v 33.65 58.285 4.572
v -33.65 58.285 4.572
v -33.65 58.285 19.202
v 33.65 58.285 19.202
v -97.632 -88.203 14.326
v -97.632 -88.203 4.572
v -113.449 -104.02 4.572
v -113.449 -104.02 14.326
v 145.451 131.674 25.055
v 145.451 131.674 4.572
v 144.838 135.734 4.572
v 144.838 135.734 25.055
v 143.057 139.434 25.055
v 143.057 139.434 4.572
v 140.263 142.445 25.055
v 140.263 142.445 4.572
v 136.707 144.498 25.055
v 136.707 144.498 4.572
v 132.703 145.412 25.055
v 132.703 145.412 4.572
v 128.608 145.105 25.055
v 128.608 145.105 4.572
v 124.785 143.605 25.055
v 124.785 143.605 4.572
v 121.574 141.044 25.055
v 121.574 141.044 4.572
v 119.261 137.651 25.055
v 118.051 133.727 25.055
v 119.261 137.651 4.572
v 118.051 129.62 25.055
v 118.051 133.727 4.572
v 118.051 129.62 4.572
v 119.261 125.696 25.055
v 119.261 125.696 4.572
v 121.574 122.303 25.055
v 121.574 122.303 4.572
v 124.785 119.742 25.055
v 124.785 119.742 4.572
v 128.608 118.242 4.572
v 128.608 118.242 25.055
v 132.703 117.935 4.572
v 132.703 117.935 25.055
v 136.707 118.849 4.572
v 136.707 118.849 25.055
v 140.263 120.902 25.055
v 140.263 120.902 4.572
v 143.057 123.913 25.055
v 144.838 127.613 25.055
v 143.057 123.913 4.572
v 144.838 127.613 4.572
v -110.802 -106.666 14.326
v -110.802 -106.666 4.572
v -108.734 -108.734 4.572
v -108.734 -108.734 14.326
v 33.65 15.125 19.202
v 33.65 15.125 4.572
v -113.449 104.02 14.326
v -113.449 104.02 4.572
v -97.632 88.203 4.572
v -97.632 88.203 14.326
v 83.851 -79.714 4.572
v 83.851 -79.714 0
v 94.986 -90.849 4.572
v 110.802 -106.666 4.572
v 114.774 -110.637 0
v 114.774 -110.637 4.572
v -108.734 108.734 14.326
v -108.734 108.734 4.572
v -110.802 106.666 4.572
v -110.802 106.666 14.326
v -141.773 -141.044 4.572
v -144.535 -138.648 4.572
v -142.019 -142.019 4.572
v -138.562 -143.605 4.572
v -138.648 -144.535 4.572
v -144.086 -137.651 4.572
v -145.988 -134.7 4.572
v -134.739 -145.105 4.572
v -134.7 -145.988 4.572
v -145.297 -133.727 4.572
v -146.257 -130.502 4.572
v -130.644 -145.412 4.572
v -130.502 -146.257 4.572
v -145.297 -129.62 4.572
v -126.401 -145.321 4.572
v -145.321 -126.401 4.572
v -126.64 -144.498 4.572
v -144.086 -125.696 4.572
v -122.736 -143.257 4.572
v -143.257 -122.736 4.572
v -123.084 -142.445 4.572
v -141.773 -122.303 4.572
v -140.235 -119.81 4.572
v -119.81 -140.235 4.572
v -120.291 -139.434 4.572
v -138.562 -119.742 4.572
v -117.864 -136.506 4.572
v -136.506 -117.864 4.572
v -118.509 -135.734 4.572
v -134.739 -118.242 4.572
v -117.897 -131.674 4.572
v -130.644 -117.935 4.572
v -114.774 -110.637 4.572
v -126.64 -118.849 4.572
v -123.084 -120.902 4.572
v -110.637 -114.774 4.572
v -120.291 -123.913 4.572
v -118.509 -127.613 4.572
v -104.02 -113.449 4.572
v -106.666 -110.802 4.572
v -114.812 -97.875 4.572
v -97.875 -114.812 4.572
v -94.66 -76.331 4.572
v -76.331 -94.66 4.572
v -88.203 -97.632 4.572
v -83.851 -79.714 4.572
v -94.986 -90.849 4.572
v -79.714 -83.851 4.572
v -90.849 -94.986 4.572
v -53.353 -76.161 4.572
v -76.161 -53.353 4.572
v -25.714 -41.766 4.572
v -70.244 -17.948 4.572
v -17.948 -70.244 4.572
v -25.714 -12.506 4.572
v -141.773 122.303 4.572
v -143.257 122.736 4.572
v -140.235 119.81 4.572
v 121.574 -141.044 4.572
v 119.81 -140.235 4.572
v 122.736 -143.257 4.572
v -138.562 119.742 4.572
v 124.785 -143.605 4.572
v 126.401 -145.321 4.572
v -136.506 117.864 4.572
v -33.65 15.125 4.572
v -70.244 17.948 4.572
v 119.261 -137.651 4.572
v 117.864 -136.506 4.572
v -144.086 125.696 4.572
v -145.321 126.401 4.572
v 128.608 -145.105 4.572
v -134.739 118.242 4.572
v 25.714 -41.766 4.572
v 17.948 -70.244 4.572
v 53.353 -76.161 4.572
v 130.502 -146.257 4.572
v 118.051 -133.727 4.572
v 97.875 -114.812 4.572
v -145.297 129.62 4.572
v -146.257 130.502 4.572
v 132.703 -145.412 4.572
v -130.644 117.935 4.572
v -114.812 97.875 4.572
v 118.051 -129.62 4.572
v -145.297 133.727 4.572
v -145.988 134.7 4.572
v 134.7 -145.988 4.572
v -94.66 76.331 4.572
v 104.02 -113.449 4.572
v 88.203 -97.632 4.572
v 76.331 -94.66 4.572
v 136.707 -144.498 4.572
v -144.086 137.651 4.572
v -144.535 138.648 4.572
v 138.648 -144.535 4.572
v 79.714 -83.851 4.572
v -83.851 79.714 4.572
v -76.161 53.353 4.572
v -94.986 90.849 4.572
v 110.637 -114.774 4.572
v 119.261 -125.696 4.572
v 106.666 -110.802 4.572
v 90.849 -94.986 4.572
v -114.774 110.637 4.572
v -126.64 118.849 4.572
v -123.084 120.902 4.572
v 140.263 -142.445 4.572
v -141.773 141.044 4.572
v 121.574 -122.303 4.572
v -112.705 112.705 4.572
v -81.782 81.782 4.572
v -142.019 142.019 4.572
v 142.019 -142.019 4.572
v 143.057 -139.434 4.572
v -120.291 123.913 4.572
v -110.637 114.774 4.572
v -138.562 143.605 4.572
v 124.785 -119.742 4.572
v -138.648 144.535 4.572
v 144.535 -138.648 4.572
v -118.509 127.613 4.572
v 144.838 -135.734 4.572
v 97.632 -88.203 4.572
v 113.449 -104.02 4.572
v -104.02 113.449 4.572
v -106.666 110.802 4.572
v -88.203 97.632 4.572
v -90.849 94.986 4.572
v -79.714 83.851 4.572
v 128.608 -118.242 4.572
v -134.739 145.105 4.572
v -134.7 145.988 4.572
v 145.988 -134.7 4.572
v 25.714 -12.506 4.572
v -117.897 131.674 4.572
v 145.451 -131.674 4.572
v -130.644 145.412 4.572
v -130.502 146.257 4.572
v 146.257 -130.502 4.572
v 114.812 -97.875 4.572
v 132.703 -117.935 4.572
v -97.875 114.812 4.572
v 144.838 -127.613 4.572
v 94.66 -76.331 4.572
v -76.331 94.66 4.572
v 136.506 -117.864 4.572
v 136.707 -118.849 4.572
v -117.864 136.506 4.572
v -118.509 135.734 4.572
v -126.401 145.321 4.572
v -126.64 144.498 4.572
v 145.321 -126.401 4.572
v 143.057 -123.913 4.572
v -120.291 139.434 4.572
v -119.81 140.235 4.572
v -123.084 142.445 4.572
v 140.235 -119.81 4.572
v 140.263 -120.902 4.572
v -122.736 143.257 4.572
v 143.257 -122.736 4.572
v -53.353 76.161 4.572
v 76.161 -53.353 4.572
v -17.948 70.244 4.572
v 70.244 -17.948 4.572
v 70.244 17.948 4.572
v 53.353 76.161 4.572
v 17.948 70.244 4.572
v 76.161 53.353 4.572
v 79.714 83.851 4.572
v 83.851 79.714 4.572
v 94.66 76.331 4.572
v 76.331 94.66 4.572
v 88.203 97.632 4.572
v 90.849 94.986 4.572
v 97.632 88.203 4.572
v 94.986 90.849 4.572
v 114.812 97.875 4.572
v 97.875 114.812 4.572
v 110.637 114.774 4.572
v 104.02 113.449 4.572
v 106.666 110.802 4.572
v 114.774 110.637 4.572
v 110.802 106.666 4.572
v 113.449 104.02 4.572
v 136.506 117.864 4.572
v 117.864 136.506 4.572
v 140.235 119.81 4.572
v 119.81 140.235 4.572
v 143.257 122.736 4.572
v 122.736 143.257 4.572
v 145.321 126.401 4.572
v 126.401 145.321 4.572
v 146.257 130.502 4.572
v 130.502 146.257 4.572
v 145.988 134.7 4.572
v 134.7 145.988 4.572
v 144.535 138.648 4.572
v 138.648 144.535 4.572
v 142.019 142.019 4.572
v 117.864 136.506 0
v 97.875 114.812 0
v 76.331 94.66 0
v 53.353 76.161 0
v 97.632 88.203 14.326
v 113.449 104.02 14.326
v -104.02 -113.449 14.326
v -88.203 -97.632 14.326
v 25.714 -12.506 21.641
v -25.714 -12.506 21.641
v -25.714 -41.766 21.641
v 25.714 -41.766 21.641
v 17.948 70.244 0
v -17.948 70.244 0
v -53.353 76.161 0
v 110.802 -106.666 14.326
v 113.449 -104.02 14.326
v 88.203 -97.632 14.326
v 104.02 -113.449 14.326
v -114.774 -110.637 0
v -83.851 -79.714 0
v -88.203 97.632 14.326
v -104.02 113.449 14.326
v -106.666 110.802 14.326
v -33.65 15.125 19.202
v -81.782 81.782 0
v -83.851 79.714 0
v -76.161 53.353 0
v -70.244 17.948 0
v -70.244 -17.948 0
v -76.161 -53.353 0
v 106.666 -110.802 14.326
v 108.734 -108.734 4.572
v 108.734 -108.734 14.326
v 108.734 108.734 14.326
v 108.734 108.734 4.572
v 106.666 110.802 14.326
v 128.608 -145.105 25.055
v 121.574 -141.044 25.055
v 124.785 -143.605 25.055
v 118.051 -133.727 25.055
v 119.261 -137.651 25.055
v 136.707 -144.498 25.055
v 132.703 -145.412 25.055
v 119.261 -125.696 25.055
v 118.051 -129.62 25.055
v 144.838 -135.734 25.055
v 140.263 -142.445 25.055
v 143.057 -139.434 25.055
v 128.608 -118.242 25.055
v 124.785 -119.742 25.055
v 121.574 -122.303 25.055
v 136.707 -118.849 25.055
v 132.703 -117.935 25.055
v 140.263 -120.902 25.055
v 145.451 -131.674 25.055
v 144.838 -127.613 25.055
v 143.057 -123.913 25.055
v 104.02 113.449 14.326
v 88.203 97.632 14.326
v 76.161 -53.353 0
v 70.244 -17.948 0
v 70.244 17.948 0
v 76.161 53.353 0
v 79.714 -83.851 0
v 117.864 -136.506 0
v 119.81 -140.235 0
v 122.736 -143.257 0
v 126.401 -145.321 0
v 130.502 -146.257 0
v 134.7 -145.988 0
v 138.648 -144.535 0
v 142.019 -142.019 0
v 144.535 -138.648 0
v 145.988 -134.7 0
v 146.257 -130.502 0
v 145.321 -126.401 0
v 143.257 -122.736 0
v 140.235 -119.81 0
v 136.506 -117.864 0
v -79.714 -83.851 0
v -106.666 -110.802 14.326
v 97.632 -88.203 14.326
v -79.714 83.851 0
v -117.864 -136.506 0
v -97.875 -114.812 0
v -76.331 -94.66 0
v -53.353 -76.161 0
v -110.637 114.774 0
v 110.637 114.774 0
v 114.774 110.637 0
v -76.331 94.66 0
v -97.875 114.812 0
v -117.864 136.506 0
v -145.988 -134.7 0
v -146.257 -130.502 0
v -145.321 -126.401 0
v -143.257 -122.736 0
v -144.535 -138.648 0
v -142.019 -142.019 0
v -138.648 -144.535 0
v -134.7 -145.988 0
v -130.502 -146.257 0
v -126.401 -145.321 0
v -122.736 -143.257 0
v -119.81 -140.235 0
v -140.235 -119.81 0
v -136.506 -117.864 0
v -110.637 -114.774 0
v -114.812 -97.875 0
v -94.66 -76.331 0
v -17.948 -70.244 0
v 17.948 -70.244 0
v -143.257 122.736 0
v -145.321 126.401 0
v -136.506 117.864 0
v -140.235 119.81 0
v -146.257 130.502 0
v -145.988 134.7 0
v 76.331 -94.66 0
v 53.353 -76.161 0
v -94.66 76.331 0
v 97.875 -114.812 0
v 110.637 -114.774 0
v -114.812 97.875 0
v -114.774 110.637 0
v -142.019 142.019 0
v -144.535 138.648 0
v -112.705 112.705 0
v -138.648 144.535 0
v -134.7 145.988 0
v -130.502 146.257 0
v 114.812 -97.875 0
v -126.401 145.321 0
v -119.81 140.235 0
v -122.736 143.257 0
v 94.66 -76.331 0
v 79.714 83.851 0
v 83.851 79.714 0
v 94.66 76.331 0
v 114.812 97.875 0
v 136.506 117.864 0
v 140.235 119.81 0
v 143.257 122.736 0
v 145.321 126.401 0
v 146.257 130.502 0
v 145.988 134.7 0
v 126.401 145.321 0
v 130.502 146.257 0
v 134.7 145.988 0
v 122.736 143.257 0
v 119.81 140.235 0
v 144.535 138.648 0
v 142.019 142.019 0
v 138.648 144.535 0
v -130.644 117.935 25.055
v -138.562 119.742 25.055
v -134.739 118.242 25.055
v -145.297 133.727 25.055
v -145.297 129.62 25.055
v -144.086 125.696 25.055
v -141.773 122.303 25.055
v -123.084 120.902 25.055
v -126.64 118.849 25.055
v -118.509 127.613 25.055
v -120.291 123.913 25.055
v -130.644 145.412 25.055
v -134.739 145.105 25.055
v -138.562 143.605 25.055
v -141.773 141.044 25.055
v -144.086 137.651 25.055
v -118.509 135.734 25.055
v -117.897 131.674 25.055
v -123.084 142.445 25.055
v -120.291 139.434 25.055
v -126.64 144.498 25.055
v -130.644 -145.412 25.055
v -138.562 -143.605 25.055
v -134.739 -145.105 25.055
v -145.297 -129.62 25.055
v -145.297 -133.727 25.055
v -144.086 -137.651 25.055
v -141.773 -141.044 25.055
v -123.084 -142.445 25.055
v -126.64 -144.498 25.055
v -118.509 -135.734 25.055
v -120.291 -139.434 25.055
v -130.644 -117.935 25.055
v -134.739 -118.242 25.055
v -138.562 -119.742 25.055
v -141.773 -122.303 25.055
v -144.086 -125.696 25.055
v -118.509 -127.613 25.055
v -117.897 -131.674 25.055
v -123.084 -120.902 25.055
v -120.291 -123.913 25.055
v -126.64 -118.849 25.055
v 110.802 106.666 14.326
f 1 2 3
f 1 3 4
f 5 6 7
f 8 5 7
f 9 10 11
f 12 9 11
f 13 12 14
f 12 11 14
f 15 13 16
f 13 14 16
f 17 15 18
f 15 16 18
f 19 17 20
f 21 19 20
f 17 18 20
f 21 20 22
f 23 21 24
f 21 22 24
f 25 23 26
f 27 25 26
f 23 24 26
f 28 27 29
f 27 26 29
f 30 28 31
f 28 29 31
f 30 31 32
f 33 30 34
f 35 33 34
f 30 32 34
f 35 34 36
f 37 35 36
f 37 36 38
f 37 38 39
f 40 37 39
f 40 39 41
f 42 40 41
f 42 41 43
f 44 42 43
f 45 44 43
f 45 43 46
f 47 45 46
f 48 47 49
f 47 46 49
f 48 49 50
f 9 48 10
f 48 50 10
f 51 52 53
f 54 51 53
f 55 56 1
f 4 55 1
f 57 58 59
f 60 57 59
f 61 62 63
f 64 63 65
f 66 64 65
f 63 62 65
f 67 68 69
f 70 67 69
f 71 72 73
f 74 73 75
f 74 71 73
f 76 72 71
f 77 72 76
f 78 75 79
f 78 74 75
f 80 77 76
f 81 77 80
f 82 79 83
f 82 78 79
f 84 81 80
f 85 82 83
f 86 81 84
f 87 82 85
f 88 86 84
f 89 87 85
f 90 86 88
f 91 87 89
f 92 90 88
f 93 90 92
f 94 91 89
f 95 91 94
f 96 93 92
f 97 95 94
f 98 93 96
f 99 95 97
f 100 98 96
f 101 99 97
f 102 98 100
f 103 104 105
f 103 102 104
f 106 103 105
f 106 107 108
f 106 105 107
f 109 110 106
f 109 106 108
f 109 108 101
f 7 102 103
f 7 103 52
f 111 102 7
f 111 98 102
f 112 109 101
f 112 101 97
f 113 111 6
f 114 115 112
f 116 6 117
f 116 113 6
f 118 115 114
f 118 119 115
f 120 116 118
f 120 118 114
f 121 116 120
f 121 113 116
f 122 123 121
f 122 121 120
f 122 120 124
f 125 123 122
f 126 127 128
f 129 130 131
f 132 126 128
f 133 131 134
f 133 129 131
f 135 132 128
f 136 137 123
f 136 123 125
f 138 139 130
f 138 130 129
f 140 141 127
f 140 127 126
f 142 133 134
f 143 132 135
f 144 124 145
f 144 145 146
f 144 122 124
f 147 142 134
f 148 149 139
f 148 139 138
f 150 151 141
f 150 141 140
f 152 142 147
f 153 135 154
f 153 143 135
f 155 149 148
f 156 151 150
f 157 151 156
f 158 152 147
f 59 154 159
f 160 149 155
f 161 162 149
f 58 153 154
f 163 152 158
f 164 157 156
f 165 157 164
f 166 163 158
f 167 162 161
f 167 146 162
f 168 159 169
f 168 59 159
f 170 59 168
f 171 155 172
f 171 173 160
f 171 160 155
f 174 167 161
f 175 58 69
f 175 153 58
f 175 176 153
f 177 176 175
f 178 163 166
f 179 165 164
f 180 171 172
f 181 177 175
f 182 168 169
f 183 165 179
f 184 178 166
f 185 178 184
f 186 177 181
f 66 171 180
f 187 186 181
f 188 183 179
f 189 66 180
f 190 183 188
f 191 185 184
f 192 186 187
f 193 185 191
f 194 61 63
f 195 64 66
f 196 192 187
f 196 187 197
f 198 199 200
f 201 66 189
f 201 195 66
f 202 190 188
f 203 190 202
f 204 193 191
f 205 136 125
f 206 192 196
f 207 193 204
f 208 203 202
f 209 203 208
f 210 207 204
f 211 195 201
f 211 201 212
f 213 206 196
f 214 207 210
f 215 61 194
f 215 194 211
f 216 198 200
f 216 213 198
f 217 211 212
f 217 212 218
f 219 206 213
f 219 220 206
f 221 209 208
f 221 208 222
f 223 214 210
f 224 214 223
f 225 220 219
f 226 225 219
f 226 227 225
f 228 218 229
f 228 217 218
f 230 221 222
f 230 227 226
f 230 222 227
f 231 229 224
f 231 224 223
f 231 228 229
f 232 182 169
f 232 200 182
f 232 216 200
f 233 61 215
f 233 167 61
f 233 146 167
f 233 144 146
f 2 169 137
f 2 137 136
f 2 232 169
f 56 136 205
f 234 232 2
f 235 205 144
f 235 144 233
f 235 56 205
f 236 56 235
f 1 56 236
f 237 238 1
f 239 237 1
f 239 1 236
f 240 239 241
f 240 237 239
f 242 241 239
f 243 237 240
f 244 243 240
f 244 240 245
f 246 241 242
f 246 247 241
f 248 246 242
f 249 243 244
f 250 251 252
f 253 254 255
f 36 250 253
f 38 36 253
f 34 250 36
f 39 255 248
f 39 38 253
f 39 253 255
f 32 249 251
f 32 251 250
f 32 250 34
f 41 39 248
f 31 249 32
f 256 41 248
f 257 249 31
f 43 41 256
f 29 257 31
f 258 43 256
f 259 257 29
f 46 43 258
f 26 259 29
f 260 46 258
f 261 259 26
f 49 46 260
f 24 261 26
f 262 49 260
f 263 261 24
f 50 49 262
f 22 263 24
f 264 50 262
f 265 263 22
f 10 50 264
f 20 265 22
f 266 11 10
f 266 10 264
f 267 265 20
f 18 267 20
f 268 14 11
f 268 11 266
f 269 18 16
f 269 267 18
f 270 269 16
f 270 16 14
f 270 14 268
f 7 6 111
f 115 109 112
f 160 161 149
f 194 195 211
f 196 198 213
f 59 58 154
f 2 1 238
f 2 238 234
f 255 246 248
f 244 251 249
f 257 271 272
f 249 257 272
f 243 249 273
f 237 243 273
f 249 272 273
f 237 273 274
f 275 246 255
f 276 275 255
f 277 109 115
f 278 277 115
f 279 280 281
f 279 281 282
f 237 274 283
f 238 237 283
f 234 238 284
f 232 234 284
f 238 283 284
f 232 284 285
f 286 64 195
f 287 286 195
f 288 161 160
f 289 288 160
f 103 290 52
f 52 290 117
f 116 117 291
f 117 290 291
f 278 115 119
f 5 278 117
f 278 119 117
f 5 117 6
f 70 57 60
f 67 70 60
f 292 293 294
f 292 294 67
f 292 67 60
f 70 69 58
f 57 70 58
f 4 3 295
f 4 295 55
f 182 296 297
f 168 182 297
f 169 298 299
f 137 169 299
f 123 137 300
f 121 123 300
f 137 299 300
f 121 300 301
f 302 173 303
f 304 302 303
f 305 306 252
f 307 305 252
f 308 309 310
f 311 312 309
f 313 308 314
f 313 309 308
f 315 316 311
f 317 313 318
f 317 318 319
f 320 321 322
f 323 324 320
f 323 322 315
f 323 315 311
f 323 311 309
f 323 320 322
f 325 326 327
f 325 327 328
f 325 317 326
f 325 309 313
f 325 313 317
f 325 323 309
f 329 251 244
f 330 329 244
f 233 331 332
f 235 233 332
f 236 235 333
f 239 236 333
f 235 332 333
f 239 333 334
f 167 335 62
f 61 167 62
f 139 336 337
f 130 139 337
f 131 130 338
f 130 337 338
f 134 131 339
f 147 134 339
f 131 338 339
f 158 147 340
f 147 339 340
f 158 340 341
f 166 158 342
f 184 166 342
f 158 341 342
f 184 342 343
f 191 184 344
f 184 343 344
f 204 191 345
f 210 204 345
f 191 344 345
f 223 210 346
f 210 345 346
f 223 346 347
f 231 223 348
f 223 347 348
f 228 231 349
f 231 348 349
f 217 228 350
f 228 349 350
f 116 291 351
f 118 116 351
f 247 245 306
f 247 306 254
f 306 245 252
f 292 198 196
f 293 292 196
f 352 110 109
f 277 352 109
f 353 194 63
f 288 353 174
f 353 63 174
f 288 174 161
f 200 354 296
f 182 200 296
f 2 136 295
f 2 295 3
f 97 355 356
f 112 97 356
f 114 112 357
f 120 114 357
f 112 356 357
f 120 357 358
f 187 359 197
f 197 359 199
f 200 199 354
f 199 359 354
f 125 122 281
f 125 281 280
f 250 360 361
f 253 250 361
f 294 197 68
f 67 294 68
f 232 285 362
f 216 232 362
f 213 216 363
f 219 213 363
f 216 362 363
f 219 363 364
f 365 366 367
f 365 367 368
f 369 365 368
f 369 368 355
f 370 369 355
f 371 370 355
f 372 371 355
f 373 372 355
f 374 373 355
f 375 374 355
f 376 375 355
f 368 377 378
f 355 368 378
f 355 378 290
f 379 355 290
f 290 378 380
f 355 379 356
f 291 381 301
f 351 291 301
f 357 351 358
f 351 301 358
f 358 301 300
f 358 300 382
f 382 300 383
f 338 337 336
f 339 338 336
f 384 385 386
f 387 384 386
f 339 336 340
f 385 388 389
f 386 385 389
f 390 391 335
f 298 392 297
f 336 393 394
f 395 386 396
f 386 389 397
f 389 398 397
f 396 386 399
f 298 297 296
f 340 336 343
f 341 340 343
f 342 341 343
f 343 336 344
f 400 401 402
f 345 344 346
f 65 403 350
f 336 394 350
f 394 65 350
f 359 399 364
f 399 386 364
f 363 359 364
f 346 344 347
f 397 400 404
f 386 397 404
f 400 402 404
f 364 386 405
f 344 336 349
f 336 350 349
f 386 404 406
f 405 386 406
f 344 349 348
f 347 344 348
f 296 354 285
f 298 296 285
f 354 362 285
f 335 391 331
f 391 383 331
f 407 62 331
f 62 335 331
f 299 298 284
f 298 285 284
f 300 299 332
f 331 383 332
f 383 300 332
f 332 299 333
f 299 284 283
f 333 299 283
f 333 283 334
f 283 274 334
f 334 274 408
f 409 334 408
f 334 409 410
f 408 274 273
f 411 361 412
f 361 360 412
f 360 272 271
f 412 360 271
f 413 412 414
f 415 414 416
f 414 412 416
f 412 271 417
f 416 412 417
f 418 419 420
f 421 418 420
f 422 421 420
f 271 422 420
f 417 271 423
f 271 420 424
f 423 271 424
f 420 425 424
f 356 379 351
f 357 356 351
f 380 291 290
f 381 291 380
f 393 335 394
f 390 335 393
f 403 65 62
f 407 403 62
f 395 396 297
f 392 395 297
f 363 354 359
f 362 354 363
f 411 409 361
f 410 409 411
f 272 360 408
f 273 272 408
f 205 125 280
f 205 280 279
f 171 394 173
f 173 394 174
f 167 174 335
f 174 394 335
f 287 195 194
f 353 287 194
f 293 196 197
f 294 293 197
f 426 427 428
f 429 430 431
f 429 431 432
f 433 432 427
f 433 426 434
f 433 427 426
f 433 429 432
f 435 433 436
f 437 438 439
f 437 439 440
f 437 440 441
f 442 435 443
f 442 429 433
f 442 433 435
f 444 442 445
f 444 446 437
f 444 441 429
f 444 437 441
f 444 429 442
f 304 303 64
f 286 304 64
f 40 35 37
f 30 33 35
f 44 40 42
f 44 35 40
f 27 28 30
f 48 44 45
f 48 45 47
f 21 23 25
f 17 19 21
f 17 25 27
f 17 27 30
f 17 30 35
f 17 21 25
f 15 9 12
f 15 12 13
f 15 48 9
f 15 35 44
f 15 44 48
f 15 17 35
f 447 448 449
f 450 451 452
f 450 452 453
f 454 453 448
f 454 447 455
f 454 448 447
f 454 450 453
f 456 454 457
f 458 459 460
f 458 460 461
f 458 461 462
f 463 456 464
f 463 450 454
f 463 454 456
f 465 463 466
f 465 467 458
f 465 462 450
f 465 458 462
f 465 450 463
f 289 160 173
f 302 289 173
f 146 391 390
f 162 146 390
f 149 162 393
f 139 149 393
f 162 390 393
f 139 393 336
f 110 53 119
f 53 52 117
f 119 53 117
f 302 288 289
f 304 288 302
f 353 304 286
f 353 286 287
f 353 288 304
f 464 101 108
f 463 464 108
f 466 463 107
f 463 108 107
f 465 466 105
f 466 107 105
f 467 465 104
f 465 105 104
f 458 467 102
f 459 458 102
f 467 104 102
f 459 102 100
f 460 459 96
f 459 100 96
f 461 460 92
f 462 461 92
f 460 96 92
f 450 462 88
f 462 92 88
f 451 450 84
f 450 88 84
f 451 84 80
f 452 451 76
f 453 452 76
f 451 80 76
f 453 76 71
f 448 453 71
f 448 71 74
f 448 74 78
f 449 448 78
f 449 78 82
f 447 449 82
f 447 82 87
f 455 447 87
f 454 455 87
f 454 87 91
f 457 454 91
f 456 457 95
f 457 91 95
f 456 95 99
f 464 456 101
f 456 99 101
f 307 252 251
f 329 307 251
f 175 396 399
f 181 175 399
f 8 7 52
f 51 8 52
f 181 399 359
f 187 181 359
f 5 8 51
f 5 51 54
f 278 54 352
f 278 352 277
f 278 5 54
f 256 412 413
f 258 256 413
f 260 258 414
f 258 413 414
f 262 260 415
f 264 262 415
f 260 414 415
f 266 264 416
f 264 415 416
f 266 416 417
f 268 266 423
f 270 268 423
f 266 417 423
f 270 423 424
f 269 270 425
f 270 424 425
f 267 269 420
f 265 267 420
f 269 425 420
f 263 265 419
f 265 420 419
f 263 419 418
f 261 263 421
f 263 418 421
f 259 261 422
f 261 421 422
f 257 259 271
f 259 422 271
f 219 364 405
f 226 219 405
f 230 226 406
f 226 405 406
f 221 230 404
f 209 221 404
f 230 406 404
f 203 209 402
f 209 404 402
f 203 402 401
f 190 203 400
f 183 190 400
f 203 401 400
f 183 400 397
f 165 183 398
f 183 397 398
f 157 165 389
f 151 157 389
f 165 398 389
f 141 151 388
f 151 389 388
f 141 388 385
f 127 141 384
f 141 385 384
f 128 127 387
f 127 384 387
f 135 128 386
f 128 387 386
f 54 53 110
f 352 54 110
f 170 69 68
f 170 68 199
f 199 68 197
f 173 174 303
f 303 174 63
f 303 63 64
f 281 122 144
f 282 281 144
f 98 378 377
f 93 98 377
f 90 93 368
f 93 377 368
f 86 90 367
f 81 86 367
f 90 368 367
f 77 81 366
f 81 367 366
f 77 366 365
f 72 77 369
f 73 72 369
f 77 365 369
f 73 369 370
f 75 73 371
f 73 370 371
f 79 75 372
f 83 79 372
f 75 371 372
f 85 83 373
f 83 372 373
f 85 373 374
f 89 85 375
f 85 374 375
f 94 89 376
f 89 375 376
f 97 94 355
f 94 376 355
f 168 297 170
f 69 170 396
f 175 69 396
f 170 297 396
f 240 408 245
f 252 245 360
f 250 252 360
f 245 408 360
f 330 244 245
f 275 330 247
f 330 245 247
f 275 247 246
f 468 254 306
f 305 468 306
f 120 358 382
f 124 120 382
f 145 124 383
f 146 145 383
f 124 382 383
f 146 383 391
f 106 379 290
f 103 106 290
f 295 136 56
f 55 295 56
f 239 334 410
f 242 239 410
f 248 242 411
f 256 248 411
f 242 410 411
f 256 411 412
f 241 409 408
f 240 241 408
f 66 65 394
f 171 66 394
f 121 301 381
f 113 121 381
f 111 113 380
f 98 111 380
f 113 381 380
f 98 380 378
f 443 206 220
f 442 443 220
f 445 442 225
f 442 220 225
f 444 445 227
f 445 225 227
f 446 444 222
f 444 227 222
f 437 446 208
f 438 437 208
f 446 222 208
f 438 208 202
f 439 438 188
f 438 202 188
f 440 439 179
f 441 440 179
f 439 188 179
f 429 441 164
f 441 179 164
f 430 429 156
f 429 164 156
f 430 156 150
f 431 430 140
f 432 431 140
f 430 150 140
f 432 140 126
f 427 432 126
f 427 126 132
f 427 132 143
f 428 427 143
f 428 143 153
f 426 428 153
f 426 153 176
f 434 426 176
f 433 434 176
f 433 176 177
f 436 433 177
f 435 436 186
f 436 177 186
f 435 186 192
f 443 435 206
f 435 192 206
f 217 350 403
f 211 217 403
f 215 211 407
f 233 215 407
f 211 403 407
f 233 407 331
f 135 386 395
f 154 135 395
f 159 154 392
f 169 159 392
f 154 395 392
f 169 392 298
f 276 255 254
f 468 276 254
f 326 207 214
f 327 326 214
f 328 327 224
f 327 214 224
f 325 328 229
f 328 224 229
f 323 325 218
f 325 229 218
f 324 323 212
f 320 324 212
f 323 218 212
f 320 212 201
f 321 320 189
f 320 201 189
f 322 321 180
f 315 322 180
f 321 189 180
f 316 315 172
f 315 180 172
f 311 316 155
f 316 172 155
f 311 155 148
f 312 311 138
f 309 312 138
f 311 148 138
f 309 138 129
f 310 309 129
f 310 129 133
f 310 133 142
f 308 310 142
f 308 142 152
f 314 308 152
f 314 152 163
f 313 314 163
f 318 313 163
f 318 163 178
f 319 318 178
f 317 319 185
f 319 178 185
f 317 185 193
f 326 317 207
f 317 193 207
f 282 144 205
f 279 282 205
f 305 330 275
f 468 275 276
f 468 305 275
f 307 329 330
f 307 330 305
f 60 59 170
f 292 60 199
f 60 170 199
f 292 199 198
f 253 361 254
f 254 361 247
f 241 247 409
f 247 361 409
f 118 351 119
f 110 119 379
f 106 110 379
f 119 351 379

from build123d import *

# Parameters (mm, degrees)
F1_DEPTH = 4.7625
F2_R     = 14.351
F3_DEPTH = 21.336
F4_DEPTH = 10.16
F2_W     = 70.104
F2_H     = 44.958
F5_DEPTH = 15.24
F2_W_2   = 53.570382297
F2_H_2   = 30.4797645658
F6_DEPTH = 17.78
F7_SCALE = 0.96


with BuildPart() as f1:
    # F0 (on Top) → F1 (new body)
    with BuildSketch(Plane.XY):
        with BuildLine():
            ThreePointArc((-55.5763468146, 79.3343931437), (-90.9271049645, 108.8918614568), (-122.7753036062, 142.1936974142))
            ThreePointArc((-122.7753036062, 142.1936974142), (-147.9363073453, 147.9363073453), (-142.1936974142, 122.7753036062))
            ThreePointArc((-142.1936974142, 122.7753036062), (-108.8918614568, 90.9271049645), (-79.3343931437, 55.5763468146))
            ThreePointArc((-79.3343931437, 55.5763468146), (-72.3967482518, 0), (-79.3343931437, -55.5763468146))
            ThreePointArc((-79.3343931437, -55.5763468146), (-108.8918614568, -90.9271049645), (-142.1936974142, -122.7753036062))
            ThreePointArc((-142.1936974142, -122.7753036062), (-147.9363073453, -147.9363073453), (-122.7753036062, -142.1936974142))
            ThreePointArc((-122.7753036062, -142.1936974142), (-90.9271049645, -108.8918614568), (-55.5763468146, -79.3343931437))
            ThreePointArc((-55.5763468146, -79.3343931437), (0, -72.3967482518), (55.5763468146, -79.3343931437))
            ThreePointArc((55.5763468146, -79.3343931437), (90.9271049645, -108.8918614568), (122.7753036062, -142.1936974142))
            ThreePointArc((122.7753036062, -142.1936974142), (147.9363073453, -147.9363073453), (142.1936974142, -122.7753036062))
            ThreePointArc((142.1936974142, -122.7753036062), (108.8918614568, -90.9271049645), (79.3343931437, -55.5763468146))
            ThreePointArc((79.3343931437, -55.5763468146), (72.3967482518, 0), (79.3343931437, 55.5763468146))
            ThreePointArc((79.3343931437, 55.5763468146), (108.8918614568, 90.9271049645), (142.1936974142, 122.7753036062))
            ThreePointArc((142.1936974142, 122.7753036062), (147.9363073453, 147.9363073453), (122.7753036062, 142.1936974142))
            ThreePointArc((122.7753036062, 142.1936974142), (90.9271049645, 108.8918614568), (55.5763468146, 79.3343931437))
            ThreePointArc((55.5763468146, 79.3343931437), (0, 72.3967482518), (-55.5763468146, 79.3343931437))
        make_face()
        Polygon((-115.2469329536, -119.5561625063), (-119.5561625063, -115.2469329536), (-87.3443447053, -83.0351151526), (-83.0351151526, -87.3443447053), align=None, mode=Mode.SUBTRACT)
        Polygon((115.2469329536, -119.5561625063), (83.0351151526, -87.3443447053), (87.3443447053, -83.0351151526), (119.5561625063, -115.2469329536), align=None, mode=Mode.SUBTRACT)
        Polygon((-119.5561625063, 115.2469329536), (-117.40154773, 117.40154773), (-115.2469329536, 119.5561625063), (-83.0351151526, 87.3443447053), (-85.189729929, 85.189729929), (-87.3443447053, 83.0351151526), align=None, mode=Mode.SUBTRACT)
        Polygon((87.3443447053, 83.0351151526), (83.0351151526, 87.3443447053), (115.2469329536, 119.5561625063), (119.5561625063, 115.2469329536), align=None, mode=Mode.SUBTRACT)
    extrude(amount=F1_DEPTH)

    # F2 (on face) → F3 (join)
    with BuildSketch(Plane.XY.offset(4.7625)):
        with Locations((-137.16, 137.16)):
            Circle(F2_R)
        with Locations((137.16, 137.16)):
            Circle(F2_R)
        with Locations((137.16, -137.16)):
            Circle(F2_R)
        with Locations((-137.16, -137.16)):
            Circle(F2_R)
    extrude(amount=F3_DEPTH)

    # F2 (on face) → F4 (join)
    with BuildSketch(Plane.XY.offset(4.7625)):
        Polygon((-108.3536930382, 118.1755252182), (-111.1099943519, 115.4192239046), (-94.6341976523, 98.9434272051), (-91.8778963387, 101.6997285187), align=None)
        Polygon((-111.1099943519, 115.4192239046), (-113.2646091282, 113.2646091282), (-115.4192239046, 111.1099943519), (-98.9434272051, 94.6341976523), (-96.7888124287, 96.7888124287), (-94.6341976523, 98.9434272051), align=None)
        Polygon((-98.9434272051, 94.6341976523), (-115.4192239046, 111.1099943519), (-118.1755252182, 108.3536930382), (-101.6997285187, 91.8778963387), align=None)
        Polygon((118.1755252182, 108.3536930382), (115.4192239046, 111.1099943519), (98.9434272051, 94.6341976523), (101.6997285187, 91.8778963387), align=None)
        Polygon((115.4192239046, 111.1099943519), (113.2646091282, 113.2646091282), (111.1099943519, 115.4192239046), (94.6341976523, 98.9434272051), (96.7888124287, 96.7888124287), (98.9434272051, 94.6341976523), align=None)
        Polygon((94.6341976523, 98.9434272051), (111.1099943519, 115.4192239046), (108.3536930382, 118.1755252182), (91.8778963387, 101.6997285187), align=None)
        Polygon((91.8778963387, -101.6997285187), (108.3536930382, -118.1755252182), (111.1099943519, -115.4192239046), (94.6341976523, -98.9434272051), align=None)
        Polygon((94.6341976523, -98.9434272051), (111.1099943519, -115.4192239046), (113.2646091282, -113.2646091282), (115.4192239046, -111.1099943519), (98.9434272051, -94.6341976523), (96.7888124287, -96.7888124287), align=None)
        Polygon((98.9434272051, -94.6341976523), (115.4192239046, -111.1099943519), (118.1755252182, -108.3536930382), (101.6997285187, -91.8778963387), align=None)
        Polygon((-98.9434272051, -94.6341976523), (-101.6997285187, -91.8778963387), (-118.1755252182, -108.3536930382), (-115.4192239046, -111.1099943519), align=None)
        Polygon((-96.7888124287, -96.7888124287), (-98.9434272051, -94.6341976523), (-115.4192239046, -111.1099943519), (-113.2646091282, -113.2646091282), (-111.1099943519, -115.4192239046), (-94.6341976523, -98.9434272051), align=None)
        Polygon((-91.8778963387, -101.6997285187), (-94.6341976523, -98.9434272051), (-111.1099943519, -115.4192239046), (-108.3536930382, -118.1755252182), align=None)
    extrude(amount=F4_DEPTH)

    # F2 (on face) → F5 (join)
    with BuildSketch(Plane.XY.offset(4.7625)):
        with Locations((0, 38.2346063852)):
            Rectangle(F2_W, F2_H)
    extrude(amount=F5_DEPTH)

    # F2 (on face) → F6 (join)
    with BuildSketch(Plane.XY.offset(4.7625)):
        with Locations((0, -28.266698122)):
            Rectangle(F2_W_2, F2_H_2)
    extrude(amount=F6_DEPTH)


with BuildPart() as f1_1:
    # F7: moved
    add(f1.part.scale(F7_SCALE))


solid = f1_1.part
